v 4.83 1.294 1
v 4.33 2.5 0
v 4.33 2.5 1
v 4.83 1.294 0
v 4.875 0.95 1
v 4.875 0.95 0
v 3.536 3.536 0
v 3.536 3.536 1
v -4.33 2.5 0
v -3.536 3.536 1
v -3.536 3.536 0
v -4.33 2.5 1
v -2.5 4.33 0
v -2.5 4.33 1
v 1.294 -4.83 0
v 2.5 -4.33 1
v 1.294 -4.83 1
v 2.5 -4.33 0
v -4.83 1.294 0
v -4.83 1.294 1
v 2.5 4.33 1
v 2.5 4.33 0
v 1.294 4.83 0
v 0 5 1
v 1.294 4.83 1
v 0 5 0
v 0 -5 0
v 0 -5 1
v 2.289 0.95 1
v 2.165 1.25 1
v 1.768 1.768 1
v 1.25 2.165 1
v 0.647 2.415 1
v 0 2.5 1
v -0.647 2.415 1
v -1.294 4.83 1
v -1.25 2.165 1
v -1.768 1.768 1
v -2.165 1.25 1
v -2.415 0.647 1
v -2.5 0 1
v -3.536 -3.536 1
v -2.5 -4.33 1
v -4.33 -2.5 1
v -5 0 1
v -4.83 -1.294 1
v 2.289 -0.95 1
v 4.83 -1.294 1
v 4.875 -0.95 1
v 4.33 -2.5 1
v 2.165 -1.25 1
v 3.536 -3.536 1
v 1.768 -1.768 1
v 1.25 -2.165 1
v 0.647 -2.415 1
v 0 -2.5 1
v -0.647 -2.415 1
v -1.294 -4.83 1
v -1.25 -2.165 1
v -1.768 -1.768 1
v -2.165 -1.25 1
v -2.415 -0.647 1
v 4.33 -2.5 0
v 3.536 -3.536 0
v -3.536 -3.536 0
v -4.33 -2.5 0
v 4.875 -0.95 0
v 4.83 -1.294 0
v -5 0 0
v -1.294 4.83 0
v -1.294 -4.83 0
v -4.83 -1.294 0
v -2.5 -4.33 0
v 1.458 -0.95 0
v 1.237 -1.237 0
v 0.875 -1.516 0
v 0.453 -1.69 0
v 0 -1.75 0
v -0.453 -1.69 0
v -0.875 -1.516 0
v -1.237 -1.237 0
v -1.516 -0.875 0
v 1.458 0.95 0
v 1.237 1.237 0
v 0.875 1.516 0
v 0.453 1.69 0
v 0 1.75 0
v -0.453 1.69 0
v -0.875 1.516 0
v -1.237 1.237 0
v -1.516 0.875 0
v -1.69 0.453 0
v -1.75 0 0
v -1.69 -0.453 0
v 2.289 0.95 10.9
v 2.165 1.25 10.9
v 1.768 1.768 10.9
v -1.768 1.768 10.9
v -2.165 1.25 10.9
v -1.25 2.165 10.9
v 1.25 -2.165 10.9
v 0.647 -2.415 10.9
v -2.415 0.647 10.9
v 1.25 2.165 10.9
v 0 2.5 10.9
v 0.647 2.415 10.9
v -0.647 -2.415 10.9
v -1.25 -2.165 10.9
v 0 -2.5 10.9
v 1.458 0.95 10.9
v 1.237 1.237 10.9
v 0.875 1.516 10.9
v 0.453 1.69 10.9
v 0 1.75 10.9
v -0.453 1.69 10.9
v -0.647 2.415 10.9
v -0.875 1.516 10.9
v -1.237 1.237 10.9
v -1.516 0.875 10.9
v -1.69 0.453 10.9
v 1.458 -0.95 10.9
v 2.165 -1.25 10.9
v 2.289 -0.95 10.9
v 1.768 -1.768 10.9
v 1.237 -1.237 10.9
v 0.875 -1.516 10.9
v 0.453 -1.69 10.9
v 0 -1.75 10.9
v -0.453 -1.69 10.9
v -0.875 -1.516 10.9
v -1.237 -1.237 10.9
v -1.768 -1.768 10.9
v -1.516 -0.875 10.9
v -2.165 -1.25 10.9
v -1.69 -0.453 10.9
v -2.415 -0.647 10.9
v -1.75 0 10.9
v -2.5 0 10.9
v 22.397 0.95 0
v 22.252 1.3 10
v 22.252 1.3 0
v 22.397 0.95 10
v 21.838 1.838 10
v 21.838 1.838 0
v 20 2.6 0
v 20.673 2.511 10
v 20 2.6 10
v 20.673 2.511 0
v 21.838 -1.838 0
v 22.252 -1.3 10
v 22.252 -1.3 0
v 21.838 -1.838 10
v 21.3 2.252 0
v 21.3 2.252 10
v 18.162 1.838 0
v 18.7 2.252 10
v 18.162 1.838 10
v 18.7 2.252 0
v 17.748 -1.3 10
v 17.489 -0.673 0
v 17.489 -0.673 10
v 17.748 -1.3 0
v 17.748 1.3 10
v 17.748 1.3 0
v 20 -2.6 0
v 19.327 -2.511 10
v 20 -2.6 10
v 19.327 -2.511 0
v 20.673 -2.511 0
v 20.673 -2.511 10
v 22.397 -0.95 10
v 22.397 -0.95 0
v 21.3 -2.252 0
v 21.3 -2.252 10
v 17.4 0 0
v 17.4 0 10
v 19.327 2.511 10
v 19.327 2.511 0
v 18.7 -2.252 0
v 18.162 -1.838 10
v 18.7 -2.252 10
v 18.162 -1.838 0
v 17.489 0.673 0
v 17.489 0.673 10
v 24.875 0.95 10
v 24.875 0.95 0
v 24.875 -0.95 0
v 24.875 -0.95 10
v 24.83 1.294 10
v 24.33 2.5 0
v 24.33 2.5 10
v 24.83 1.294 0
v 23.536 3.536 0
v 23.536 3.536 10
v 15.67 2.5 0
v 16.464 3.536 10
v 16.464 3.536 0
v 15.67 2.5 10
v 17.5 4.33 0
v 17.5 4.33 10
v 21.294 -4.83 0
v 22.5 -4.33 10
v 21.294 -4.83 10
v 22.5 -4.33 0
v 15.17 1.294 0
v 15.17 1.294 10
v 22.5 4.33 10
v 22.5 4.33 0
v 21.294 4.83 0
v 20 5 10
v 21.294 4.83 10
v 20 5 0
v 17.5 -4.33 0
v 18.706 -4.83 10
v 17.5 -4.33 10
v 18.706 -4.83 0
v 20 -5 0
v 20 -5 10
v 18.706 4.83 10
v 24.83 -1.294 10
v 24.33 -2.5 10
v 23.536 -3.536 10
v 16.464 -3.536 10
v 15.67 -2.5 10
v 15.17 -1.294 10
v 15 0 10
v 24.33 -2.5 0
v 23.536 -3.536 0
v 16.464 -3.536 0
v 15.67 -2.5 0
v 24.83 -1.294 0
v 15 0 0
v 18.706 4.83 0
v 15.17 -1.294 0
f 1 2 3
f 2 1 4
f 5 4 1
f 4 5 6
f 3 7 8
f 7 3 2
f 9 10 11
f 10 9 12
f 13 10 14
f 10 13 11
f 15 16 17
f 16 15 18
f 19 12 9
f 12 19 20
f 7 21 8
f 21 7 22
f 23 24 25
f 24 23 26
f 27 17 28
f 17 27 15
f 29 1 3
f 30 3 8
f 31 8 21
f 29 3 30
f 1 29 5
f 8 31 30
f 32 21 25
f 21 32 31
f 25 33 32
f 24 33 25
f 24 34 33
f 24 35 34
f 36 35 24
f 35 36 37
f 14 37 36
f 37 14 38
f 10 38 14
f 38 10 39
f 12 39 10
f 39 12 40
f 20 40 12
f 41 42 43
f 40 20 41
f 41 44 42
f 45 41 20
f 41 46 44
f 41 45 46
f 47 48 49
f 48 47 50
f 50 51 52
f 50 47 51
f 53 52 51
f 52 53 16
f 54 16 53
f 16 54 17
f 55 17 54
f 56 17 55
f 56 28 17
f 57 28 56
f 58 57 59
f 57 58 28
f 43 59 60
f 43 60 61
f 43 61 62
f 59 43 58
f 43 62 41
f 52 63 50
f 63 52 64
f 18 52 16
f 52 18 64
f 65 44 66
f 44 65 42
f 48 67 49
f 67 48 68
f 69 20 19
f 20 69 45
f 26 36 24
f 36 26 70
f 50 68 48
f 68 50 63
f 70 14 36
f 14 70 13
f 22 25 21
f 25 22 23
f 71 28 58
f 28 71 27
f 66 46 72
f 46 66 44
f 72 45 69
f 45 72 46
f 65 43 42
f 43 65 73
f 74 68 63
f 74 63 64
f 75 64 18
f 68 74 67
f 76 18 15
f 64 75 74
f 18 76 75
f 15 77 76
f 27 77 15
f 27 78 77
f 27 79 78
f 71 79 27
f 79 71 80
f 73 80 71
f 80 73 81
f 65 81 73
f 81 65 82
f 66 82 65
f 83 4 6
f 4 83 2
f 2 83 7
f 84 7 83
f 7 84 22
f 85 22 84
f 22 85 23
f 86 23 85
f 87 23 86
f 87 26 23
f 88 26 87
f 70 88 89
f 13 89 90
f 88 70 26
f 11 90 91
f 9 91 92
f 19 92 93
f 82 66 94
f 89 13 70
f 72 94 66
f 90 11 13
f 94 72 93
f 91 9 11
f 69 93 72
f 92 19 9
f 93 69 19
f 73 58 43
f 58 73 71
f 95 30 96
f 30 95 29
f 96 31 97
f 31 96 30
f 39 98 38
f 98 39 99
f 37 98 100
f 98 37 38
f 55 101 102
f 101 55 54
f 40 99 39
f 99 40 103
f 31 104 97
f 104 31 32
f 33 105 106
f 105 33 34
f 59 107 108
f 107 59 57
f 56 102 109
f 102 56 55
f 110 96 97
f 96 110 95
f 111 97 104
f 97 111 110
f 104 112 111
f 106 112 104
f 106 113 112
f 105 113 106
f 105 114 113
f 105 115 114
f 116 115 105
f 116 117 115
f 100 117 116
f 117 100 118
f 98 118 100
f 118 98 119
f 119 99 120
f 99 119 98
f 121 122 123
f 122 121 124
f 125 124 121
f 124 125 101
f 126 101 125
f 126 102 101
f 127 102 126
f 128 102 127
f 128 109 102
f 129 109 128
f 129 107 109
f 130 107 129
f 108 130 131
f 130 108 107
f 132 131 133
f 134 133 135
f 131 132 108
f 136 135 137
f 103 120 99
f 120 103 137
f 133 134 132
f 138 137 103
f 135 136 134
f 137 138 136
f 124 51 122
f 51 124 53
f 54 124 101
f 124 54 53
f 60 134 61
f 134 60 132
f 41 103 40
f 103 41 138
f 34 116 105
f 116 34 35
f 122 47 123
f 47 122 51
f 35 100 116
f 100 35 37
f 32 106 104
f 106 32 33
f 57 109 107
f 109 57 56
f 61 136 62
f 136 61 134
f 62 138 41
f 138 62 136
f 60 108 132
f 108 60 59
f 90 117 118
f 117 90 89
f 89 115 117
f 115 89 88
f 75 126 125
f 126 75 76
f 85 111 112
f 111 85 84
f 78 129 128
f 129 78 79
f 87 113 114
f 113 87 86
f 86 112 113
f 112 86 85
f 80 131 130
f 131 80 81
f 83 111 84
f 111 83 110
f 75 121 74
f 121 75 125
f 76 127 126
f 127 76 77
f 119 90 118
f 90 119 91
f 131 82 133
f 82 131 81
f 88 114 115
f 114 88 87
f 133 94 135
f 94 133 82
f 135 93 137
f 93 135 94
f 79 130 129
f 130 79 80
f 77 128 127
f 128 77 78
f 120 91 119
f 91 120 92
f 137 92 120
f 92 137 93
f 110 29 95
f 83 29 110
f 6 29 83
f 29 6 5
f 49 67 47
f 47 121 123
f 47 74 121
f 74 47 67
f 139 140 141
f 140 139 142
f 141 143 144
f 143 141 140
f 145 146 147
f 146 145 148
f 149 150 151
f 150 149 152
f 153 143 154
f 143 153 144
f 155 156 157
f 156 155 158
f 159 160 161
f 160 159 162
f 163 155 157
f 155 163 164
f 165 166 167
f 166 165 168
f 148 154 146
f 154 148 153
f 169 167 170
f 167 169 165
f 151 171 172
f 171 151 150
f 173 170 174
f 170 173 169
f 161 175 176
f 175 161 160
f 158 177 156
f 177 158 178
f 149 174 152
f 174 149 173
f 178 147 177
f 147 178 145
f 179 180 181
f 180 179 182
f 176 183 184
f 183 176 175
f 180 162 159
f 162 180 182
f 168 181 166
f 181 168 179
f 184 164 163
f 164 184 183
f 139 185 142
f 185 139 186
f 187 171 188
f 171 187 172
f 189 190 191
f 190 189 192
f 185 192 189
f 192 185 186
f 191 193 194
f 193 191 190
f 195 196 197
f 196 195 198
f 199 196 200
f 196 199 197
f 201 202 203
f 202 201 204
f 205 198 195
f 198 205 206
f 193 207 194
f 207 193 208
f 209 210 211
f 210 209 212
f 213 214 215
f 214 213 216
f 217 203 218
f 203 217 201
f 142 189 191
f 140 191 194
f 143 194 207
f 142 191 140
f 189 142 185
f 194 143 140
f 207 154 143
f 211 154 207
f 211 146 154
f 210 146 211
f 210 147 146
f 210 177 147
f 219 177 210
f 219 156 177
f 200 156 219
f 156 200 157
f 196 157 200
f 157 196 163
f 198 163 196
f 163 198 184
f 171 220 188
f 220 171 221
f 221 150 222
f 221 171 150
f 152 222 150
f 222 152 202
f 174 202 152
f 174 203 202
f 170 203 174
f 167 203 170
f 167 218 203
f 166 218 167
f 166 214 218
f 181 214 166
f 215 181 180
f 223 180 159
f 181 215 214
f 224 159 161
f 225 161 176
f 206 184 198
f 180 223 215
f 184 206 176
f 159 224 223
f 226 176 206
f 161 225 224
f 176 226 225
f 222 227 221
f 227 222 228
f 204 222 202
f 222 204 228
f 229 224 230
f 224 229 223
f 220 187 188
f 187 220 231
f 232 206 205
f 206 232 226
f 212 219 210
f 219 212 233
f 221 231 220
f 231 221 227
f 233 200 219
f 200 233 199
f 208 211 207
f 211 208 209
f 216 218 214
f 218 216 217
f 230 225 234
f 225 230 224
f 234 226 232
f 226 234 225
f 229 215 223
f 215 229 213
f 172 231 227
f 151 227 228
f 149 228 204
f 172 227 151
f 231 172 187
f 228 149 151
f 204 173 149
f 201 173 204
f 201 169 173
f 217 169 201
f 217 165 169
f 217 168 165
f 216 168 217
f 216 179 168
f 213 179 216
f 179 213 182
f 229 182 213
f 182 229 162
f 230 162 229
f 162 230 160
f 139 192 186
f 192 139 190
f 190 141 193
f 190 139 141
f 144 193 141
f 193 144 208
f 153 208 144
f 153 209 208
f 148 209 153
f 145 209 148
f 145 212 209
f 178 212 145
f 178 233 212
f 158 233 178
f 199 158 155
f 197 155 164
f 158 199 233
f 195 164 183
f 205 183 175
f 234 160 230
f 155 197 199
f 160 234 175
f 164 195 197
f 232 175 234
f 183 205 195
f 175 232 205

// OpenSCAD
/**
 * This work is licensed under a <a rel="license" href="https://creativecommons.org/licenses/by-sa/4.0/">Creative Commons Attribution 4.0 Unported License</a>.
 * You can find this on thingiverse: http://www.thingiverse.com/thing:1837609
 */

$fn = 24;
inner_diam = 1.75;

// inner ring
difference() {
    union() {
        cylinder(r=inner_diam+3.25, h=1);
        translate([0, 0, 0.9]) {
            cylinder(r=inner_diam+0.75, h=10);
        }
    }
    translate([0, 0, -1]) {
        cylinder(r=inner_diam, h=20);
        translate([0, -0.95, 0]) {
            cube([10, inner_diam+0.15, 20]);
        }
    }
}

// outer ring
translate([20, 0, 0]) {
    difference() {
        cylinder(r=inner_diam+3.25, h=10);
        translate([0, 0, -1]) {
            cylinder(r=inner_diam+0.85, h=20);
            translate([0, -0.95, 0]) {
                cube([10, inner_diam+0.15, 20]);
            }
        }
    }
}
